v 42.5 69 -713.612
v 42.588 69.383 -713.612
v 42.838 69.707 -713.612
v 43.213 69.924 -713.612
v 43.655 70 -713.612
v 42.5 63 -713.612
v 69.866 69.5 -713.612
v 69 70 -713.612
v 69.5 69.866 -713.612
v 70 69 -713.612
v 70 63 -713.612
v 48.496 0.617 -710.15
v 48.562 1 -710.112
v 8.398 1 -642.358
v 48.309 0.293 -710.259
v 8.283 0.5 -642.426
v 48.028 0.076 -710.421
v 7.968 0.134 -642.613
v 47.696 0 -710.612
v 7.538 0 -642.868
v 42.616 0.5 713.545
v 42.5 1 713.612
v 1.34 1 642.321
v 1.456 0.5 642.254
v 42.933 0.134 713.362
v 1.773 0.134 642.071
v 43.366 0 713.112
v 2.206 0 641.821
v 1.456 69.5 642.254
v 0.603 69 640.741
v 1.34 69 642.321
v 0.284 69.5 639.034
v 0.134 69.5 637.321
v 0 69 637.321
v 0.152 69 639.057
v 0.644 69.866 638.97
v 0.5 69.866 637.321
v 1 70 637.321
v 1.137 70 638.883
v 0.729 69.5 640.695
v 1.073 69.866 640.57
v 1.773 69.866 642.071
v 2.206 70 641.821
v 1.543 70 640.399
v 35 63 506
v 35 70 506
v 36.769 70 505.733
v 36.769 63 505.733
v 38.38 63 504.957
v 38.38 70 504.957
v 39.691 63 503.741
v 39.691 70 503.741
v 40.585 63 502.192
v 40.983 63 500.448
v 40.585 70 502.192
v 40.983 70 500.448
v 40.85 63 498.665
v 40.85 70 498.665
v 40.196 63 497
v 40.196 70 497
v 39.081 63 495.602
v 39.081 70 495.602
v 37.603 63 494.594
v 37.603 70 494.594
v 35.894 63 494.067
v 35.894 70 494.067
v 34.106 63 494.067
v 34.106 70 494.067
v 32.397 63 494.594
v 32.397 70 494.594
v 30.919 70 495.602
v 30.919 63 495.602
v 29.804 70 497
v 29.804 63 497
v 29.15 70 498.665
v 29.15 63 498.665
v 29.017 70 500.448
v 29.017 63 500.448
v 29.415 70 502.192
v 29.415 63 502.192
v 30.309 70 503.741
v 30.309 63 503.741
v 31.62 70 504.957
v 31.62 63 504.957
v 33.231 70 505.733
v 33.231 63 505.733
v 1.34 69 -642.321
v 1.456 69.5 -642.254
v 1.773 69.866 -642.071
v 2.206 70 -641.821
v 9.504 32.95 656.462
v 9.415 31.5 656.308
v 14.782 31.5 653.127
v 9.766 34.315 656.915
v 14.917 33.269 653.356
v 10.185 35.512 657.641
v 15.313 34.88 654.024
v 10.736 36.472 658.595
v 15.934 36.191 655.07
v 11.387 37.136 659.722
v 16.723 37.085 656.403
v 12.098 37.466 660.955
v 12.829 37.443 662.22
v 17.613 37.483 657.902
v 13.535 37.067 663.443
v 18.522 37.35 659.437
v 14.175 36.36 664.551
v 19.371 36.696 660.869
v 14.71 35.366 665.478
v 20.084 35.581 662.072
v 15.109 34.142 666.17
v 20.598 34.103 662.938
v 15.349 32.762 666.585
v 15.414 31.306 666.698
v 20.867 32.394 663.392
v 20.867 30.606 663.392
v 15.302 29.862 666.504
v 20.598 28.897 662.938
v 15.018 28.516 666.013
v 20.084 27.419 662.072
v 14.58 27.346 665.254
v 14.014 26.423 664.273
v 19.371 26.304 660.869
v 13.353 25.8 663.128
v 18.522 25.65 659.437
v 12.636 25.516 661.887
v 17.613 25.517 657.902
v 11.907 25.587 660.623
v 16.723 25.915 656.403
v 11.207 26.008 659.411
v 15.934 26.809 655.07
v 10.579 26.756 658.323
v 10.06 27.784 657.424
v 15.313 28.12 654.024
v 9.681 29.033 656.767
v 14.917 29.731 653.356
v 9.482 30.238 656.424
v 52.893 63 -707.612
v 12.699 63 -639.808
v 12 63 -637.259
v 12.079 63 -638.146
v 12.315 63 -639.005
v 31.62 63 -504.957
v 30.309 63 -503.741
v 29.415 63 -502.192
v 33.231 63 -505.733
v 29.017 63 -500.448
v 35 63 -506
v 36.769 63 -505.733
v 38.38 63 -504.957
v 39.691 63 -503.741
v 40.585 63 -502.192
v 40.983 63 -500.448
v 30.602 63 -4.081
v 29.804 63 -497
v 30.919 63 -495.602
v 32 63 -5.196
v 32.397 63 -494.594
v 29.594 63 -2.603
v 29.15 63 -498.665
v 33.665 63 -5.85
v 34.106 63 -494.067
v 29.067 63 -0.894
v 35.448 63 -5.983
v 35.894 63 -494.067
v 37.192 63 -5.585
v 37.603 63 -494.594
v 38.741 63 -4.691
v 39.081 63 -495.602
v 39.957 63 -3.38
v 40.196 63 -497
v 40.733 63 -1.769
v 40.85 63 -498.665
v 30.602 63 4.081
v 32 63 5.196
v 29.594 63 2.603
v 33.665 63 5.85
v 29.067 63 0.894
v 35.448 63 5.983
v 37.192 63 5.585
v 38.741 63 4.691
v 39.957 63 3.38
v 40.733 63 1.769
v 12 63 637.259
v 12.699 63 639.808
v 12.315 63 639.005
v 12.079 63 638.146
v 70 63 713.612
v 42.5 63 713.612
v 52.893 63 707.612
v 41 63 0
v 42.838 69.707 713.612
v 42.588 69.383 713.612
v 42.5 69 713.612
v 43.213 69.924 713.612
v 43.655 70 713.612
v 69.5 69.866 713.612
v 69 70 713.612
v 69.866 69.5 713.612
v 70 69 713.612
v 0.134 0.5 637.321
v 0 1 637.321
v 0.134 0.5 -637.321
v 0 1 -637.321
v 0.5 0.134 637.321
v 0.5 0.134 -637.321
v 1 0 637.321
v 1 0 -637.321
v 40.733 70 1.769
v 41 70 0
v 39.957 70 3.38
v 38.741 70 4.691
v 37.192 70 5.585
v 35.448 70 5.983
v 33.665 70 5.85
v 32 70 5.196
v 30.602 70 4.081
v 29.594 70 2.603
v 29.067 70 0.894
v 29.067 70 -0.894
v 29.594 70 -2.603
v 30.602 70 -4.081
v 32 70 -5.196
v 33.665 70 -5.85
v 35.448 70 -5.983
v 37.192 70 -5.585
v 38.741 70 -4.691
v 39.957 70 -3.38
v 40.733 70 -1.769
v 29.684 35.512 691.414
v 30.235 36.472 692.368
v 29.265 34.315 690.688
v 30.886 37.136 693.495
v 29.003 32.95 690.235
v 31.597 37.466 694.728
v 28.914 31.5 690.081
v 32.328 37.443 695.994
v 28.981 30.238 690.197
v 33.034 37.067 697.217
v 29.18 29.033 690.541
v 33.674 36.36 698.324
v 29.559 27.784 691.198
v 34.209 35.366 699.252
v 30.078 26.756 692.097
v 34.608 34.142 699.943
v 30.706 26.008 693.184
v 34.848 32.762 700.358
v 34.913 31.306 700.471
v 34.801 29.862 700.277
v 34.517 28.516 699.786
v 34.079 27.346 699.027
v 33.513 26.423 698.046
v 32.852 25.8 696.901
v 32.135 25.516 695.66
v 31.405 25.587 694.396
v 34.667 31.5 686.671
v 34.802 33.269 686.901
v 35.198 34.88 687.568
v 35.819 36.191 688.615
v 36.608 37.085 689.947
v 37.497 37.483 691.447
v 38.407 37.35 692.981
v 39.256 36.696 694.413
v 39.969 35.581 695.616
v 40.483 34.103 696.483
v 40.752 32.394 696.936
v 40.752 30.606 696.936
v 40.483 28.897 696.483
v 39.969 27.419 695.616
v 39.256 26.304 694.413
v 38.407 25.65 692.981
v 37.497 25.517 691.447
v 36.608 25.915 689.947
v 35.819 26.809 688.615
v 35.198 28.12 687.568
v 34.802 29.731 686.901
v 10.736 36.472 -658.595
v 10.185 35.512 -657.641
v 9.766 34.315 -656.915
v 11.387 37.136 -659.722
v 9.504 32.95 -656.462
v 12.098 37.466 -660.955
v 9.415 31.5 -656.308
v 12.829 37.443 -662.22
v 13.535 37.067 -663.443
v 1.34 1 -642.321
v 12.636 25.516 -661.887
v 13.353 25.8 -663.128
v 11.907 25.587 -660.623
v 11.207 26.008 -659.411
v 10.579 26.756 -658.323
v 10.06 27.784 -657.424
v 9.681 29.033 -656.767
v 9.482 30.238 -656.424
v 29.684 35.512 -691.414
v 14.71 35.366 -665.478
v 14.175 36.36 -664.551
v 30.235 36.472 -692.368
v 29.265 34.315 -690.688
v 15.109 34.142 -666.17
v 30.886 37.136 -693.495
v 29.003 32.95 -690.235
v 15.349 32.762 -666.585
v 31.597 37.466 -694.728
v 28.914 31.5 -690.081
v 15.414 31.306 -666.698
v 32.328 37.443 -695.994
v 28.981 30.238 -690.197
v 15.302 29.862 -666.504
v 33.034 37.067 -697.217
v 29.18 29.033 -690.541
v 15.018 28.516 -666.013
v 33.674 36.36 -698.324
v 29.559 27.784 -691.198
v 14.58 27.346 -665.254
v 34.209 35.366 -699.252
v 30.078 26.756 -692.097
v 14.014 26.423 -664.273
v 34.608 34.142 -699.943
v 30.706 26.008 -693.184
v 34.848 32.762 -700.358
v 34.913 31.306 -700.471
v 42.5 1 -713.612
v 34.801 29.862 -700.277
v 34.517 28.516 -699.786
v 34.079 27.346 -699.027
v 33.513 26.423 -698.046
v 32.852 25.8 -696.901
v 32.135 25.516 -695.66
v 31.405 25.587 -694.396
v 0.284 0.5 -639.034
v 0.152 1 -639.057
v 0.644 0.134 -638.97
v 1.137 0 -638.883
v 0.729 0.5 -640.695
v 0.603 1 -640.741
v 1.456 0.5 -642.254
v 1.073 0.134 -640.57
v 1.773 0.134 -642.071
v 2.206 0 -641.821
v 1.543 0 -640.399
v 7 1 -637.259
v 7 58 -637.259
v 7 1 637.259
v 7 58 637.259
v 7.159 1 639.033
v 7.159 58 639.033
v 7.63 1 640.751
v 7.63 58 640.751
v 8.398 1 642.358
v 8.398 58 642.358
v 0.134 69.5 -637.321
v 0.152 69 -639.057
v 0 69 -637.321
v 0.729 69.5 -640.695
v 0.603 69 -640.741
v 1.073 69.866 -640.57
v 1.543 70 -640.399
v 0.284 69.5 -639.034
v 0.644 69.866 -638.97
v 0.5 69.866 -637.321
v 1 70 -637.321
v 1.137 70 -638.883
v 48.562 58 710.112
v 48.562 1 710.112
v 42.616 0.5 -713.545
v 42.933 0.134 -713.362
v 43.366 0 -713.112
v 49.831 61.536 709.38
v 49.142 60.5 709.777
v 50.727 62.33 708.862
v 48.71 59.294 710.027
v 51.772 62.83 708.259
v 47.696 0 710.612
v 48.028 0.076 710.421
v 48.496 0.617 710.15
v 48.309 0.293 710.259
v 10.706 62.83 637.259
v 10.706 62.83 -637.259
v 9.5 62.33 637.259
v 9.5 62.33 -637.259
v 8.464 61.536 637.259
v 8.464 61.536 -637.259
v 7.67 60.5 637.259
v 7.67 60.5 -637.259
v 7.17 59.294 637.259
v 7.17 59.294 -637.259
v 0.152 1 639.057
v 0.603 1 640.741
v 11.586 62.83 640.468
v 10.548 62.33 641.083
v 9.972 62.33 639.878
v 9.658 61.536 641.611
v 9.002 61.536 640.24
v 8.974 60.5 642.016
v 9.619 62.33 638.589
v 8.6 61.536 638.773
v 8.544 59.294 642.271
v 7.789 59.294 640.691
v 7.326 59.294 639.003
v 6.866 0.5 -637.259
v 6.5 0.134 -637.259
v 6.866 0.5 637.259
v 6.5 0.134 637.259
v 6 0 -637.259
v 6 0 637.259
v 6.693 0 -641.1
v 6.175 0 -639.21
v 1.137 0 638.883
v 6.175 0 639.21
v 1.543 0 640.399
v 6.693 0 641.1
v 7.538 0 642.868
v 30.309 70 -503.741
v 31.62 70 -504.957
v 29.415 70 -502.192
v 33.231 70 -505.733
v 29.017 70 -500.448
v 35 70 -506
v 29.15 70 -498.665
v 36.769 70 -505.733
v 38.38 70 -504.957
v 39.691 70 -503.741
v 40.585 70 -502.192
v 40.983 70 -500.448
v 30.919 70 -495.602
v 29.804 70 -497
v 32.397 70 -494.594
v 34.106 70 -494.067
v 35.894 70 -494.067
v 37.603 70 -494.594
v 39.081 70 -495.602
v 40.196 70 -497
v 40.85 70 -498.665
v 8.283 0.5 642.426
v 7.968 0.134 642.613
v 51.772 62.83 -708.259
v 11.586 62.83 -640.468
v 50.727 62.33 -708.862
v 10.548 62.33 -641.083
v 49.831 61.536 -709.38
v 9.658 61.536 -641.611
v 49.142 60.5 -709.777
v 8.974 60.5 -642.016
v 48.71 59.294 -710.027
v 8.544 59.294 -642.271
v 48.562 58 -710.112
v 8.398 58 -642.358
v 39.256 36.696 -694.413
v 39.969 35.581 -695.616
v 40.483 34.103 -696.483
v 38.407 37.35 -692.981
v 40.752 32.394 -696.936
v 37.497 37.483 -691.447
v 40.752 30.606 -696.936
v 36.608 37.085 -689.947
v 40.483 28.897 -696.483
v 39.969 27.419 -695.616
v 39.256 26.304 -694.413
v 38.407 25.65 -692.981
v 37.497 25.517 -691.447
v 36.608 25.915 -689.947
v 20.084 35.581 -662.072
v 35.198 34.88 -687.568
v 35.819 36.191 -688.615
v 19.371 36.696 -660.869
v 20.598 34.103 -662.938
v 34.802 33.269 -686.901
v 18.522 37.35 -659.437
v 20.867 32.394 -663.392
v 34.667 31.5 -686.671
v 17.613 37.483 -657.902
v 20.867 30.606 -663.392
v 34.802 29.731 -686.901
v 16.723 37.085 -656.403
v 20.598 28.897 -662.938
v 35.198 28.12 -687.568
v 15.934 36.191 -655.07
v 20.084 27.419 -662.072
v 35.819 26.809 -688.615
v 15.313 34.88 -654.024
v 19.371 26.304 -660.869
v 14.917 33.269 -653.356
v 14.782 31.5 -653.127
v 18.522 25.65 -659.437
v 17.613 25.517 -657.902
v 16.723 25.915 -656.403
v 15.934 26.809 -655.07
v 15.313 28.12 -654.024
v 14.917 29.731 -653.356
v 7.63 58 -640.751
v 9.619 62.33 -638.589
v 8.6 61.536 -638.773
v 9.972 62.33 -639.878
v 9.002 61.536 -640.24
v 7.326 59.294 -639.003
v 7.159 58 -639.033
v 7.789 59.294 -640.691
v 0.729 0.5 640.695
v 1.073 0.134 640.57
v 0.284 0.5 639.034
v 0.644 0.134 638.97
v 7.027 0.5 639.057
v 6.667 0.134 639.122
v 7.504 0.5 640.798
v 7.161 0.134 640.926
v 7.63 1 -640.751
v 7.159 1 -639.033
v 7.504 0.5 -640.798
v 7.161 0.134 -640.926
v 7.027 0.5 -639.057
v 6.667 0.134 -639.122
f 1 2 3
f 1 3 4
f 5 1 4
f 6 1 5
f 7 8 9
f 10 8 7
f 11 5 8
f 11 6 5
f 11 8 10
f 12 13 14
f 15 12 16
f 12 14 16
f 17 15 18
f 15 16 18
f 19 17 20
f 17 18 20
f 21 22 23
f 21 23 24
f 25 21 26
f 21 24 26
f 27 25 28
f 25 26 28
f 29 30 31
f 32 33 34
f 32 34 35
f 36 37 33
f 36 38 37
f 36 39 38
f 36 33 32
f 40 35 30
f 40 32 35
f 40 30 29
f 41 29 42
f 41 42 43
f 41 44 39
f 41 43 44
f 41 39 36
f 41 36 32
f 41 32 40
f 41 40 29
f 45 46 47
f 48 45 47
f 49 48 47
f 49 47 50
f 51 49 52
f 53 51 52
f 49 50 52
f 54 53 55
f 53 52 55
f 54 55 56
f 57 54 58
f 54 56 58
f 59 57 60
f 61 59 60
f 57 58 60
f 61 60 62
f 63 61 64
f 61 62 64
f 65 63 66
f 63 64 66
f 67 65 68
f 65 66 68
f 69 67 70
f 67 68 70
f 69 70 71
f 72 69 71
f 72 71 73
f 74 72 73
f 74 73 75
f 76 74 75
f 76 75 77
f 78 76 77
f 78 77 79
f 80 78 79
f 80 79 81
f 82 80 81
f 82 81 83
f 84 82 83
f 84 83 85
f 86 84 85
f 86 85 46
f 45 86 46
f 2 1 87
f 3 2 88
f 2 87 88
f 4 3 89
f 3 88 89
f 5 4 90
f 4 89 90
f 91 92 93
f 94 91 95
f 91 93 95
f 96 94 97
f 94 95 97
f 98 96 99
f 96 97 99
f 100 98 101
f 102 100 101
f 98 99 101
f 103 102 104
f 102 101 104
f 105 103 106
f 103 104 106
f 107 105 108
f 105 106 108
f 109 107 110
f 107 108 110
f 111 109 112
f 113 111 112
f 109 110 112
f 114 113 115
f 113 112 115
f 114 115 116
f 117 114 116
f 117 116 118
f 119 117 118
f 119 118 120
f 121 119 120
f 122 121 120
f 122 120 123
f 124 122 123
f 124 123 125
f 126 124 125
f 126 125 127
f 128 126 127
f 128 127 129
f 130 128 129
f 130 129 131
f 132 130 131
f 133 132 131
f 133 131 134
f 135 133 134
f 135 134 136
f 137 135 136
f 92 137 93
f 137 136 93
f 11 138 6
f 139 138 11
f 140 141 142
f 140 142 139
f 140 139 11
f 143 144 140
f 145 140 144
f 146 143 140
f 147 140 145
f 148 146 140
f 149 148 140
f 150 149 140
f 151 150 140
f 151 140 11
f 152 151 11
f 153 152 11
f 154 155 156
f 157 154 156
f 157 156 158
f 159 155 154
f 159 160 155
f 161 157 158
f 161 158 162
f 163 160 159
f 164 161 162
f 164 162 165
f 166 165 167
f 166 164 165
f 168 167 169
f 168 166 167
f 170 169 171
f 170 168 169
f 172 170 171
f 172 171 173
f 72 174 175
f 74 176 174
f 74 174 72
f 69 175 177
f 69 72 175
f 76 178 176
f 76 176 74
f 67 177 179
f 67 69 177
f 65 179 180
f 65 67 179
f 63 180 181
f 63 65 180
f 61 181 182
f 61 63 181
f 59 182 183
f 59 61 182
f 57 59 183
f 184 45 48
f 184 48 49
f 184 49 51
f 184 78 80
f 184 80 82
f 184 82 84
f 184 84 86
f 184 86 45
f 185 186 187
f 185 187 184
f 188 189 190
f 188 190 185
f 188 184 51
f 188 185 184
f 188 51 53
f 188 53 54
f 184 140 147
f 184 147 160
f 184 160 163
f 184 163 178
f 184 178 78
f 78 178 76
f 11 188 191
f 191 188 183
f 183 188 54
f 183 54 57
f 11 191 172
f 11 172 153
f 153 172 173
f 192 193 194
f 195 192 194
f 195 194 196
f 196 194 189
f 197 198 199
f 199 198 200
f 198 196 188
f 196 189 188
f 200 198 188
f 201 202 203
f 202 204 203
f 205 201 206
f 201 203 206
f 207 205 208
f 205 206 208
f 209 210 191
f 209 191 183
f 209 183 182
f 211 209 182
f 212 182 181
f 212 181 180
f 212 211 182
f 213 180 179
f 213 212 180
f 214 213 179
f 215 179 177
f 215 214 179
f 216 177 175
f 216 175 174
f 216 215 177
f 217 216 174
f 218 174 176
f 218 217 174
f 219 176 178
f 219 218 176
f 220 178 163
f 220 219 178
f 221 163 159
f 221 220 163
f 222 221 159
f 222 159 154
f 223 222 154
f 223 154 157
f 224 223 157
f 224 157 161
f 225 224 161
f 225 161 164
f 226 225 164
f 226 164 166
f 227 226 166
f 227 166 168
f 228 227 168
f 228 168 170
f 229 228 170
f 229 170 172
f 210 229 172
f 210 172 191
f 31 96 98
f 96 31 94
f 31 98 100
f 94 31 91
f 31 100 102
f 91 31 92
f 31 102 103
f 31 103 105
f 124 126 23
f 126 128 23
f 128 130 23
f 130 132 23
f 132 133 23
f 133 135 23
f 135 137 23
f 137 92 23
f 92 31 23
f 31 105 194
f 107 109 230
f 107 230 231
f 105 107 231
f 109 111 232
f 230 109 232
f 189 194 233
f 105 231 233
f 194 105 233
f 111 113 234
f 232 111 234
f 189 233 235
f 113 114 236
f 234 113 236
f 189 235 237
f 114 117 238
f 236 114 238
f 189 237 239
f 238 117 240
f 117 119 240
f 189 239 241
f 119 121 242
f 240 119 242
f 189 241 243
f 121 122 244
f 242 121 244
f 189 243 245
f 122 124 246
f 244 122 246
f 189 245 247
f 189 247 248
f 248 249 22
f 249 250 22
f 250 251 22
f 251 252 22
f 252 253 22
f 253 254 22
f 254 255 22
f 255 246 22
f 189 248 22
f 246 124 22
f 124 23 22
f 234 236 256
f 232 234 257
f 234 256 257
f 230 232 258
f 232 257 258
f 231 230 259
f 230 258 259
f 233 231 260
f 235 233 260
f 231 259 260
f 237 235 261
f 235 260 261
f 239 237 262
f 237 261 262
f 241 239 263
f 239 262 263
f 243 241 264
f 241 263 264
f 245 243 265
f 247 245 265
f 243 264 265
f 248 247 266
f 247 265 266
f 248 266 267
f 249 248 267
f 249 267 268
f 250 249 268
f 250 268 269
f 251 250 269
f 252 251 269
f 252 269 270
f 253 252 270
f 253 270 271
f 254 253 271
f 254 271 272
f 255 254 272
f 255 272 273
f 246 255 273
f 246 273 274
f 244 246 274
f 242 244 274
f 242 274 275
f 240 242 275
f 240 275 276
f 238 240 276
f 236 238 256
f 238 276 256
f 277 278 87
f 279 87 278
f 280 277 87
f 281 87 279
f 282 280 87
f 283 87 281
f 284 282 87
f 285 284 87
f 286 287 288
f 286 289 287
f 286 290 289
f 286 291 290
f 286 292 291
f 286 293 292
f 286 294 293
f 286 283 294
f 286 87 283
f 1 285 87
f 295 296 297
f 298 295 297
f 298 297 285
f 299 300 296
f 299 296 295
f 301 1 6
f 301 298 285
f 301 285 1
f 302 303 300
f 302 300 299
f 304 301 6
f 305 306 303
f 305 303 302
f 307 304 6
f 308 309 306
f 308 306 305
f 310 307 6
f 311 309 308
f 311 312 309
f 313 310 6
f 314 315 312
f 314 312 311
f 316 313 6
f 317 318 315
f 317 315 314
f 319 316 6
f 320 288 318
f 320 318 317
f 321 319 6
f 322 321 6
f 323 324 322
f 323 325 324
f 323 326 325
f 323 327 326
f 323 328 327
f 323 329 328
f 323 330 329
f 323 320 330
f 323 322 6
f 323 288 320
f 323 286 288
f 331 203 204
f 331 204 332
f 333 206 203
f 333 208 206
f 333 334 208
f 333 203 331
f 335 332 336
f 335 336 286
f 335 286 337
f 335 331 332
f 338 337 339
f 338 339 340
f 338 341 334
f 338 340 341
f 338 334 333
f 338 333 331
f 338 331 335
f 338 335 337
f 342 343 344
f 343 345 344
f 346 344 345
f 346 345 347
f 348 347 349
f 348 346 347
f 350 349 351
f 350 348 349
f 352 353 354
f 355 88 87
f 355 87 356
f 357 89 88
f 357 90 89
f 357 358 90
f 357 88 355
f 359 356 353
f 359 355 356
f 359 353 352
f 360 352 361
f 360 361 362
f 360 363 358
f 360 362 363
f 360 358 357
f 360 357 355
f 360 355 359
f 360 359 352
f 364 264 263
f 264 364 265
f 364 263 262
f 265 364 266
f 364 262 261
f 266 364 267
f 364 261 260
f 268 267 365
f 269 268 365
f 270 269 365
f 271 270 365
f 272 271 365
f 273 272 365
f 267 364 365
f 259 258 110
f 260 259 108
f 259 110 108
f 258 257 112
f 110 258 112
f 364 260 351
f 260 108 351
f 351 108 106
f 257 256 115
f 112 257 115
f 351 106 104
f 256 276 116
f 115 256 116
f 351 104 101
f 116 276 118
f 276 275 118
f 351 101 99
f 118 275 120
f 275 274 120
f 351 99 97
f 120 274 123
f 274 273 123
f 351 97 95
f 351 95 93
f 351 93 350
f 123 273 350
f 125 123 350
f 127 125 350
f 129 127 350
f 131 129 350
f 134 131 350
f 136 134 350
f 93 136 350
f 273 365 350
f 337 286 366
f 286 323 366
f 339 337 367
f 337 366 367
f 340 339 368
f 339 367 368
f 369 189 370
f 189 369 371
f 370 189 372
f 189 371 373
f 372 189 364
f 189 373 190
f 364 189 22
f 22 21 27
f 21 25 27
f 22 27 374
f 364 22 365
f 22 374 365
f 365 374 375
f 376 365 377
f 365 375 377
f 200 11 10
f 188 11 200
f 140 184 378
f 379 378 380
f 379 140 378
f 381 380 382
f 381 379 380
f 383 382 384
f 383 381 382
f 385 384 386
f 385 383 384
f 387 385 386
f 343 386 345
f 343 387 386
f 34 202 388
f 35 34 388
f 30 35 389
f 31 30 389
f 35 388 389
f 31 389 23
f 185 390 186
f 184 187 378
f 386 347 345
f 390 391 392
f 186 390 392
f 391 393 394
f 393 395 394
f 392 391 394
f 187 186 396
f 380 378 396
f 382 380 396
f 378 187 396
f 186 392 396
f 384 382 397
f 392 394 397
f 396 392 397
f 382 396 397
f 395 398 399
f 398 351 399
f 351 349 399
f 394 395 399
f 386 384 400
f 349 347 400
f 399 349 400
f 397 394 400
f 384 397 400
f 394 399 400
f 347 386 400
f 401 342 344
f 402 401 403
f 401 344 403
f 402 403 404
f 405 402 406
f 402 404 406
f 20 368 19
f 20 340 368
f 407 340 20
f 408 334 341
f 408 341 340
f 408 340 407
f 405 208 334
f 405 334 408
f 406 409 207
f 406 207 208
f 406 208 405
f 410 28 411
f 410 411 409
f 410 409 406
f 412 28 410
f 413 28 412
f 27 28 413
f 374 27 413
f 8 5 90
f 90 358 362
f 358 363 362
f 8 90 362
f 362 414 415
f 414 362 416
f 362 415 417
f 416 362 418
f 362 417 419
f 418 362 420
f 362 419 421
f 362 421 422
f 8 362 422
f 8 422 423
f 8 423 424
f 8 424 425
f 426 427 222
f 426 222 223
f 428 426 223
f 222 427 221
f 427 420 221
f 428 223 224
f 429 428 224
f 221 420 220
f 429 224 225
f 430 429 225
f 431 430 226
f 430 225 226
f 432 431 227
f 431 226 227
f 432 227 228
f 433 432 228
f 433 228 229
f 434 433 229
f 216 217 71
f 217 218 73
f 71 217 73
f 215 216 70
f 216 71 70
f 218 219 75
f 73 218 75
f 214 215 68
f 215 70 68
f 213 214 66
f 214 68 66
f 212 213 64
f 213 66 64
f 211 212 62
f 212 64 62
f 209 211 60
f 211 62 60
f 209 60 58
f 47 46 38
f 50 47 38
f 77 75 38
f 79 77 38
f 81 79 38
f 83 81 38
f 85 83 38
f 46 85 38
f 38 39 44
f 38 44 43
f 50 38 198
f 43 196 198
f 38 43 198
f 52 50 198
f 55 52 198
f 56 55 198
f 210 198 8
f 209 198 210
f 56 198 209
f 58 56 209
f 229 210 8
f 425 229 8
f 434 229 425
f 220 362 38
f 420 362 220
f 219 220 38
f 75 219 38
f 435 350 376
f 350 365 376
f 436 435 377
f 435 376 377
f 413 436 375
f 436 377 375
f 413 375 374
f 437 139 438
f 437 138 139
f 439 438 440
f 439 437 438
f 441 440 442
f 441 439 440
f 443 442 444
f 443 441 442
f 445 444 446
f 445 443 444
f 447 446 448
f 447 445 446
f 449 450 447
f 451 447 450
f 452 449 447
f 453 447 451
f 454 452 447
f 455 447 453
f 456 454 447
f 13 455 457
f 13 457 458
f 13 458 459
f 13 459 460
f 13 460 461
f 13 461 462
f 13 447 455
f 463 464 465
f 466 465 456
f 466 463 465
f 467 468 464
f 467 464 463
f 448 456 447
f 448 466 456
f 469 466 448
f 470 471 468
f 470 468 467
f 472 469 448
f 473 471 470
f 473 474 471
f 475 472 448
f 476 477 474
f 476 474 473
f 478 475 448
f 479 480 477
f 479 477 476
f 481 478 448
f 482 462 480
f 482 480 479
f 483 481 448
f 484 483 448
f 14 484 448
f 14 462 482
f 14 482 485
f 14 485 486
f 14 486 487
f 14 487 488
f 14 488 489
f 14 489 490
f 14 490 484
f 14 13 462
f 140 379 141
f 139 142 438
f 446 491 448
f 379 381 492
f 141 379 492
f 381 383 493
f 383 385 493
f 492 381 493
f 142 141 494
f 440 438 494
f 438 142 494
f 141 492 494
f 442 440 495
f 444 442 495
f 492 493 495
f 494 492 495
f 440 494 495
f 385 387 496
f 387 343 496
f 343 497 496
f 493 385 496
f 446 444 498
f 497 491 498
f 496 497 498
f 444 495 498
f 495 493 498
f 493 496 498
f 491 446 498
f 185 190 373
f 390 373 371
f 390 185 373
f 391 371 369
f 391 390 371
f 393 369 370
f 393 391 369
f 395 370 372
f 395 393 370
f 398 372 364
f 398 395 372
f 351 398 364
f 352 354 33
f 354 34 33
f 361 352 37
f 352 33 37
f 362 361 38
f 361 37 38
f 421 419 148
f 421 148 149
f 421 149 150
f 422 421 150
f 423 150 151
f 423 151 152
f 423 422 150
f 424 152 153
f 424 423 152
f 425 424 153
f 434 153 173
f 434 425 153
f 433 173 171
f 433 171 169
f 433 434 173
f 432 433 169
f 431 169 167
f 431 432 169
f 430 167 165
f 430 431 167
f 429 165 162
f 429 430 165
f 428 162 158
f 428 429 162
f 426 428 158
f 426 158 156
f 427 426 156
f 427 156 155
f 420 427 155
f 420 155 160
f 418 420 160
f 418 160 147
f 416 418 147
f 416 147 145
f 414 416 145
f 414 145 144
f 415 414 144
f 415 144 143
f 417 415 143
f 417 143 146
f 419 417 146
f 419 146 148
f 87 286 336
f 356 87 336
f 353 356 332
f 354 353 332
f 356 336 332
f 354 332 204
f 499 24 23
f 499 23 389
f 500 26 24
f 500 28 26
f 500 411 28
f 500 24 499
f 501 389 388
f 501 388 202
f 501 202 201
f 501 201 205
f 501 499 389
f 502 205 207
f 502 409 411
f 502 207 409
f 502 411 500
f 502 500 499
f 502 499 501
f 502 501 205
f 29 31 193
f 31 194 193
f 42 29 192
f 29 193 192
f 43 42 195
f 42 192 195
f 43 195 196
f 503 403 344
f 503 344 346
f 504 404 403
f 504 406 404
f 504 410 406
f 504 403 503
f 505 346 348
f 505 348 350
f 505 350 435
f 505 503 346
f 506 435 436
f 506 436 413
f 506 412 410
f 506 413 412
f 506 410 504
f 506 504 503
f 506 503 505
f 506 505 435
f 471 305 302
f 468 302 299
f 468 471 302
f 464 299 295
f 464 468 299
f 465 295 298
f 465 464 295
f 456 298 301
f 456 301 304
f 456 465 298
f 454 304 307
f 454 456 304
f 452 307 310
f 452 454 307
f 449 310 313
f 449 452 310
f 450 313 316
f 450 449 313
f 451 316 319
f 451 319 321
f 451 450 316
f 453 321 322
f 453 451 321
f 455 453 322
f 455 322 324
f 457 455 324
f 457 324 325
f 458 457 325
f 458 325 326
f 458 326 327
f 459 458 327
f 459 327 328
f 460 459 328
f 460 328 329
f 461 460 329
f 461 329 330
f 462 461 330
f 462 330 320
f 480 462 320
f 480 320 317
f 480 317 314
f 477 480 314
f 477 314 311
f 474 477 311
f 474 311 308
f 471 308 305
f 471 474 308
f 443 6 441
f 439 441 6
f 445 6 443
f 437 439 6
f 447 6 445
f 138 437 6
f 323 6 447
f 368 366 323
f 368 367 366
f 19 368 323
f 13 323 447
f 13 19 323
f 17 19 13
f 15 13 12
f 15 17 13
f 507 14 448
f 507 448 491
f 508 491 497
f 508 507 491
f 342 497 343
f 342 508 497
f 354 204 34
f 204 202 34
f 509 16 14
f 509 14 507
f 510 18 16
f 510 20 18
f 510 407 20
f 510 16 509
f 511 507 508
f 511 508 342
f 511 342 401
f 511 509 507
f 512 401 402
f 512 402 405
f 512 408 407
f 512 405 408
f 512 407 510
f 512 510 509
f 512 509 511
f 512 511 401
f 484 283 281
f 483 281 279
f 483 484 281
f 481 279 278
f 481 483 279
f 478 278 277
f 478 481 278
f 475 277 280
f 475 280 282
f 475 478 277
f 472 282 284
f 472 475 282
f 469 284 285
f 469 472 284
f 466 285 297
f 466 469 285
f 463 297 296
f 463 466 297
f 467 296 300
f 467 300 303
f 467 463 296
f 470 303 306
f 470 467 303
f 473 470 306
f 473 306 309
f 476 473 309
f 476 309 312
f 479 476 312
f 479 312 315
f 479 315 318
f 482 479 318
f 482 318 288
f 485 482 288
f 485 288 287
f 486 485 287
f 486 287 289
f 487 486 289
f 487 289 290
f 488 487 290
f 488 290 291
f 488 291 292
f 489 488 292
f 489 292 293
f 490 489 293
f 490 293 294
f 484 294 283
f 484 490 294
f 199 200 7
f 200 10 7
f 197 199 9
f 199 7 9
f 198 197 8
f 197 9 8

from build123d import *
from build123d.topology import SkipClean

# Parameters (mm, degrees)
BOSS_EXTRUDE1_DEPTH = 640
SKETCH22_R          = 6
CUT_EXTRUDE4_DEPTH  = 10
BOSS_EXTRUDE2_DEPTH = 63
BOSS_EXTRUDE3_DEPTH = 7
SKETCH26_R          = 6
CUT_EXTRUDE5_DEPTH  = 7
FILLET1_R           = 10
FILLET2_R           = 10
FILLET3_R           = 5
FILLET5_R           = 1


with BuildPart() as part:
    # Sketch1 → Boss-Extrude1 (new body)
    with BuildSketch(Plane.XY):
        Polygon((0, 0), (0, 70), (70, 70), (70, 63), (7, 63), (7, 0), align=None)
    extrude(amount=BOSS_EXTRUDE1_DEPTH)

    # Sketch22 → Cut-Extrude4 (cut)
    with BuildSketch(Plane(origin=(0, 70, 0), x_dir=(1, 0, 0), z_dir=(0, 1, 0))):
        with Locations((35, 0)):
            Circle(SKETCH22_R)
        with Locations((35, 500)):
            Circle(SKETCH22_R)
        with Locations(Location((35, -500, 0), (0, 0, 270))):
            Circle(SKETCH22_R)
    extrude(amount=-CUT_EXTRUDE4_DEPTH, mode=Mode.SUBTRACT)

    # Sketch23 → Boss-Extrude2 (add)
    with BuildSketch(Plane(origin=(0, 0, 0), x_dir=(1, 0, 0), z_dir=(0, 1, 0))):
        Polygon((0, -640), (42.5, -713.612159322), (48.562177826, -710.112159322), (7, -640), align=None)
    extrude(amount=BOSS_EXTRUDE2_DEPTH)

    # Sketch25 → Boss-Extrude3 (add)
    with BuildSketch(Plane(origin=(0, 63, 0), x_dir=(1, 0, 0), z_dir=(0, 1, 0))):
        Polygon((70, -640), (0, -640), (42.5, -713.612159322), (70, -713.612159322), align=None)
    extrude(amount=BOSS_EXTRUDE3_DEPTH)

    # Sketch26 → Cut-Extrude5 (cut)
    with BuildSketch(Plane(origin=(-275.556719825, 0, 163.348804279), x_dir=(-0.5099316128113042, 0, -0.8602149442178172), z_dir=(0.8602149442178172, 0, -0.5099316128113042))):
        with Locations((-614.36248118, 31.5)):
            Circle(SKETCH26_R)
        with Locations((-575.367085589, 31.5)):
            Circle(SKETCH26_R)
    extrude(amount=-CUT_EXTRUDE5_DEPTH, mode=Mode.SUBTRACT)

    # Mirror1: part across plane


with BuildPart() as part_1:
    with SkipClean():  # the faces are left unmerged after this step: merging them gives an invalid solid
        add(part.part)
        add(part.part.mirror(Plane.XY))

    # Fillet1
    fillet1_edges = [part_1.edges().sort_by_distance(p)[0] for p in [
        (0, 35, 640),
        (0, 35, -640),
    ]]
    fillet(fillet1_edges, radius=FILLET1_R)

    # Fillet2
    fillet2_edges = [part_1.edges().sort_by_distance(p)[0] for p in [
        (7, 31.5, -640),
        (7, 31.5, 640),
    ]]
    fillet(fillet2_edges, radius=FILLET2_R)

    # Fillet3
    fillet3_edges = [part_1.edges().sort_by_distance(p)[0] for p in [
        (7, 63, 318.629374486),
        (7.355792038, 63, -639.902468471),
        (7.355792038, 63, 639.902468471),
        (28.480014192, 63, 676.235112211),
        (28.480014192, 63, -676.235112211),
    ]]
    fillet(fillet3_edges, radius=FILLET3_R)

    # Fillet5
    fillet5_edges = [part_1.edges().sort_by_distance(p)[0] for p in [
        (0, 70, 318.660254038),
        (0, 0, 318.660254038),
        (70, 70, 356.806079661),
        (21.919872981, 0, -677.966333699),
        (21.919872981, 0, 677.966333699),
        (0.340741737, 0, 639.908698527),
        (0.340741737, 0, -639.908698527),
        (21.919872981, 70, -677.966333699),
        (21.919872981, 70, 677.966333699),
        (0.340741737, 70, 639.908698527),
        (0.340741737, 70, -639.908698527),
        (7, 0, 318.629374486),
        (7.355792038, 0, 639.902468471),
        (7.355792038, 0, -639.902468471),
        (0, 70, 318.660254038),
        (0, 70, -318.660254038),
        (70, 70, 356.806079661),
        (70, 70, -356.806079661),
        (28.480014192, 0, 676.235112211),
        (28.480014192, 0, -676.235112211),
    ]]
    fillet(fillet5_edges, radius=FILLET5_R)


solid = part_1.part
